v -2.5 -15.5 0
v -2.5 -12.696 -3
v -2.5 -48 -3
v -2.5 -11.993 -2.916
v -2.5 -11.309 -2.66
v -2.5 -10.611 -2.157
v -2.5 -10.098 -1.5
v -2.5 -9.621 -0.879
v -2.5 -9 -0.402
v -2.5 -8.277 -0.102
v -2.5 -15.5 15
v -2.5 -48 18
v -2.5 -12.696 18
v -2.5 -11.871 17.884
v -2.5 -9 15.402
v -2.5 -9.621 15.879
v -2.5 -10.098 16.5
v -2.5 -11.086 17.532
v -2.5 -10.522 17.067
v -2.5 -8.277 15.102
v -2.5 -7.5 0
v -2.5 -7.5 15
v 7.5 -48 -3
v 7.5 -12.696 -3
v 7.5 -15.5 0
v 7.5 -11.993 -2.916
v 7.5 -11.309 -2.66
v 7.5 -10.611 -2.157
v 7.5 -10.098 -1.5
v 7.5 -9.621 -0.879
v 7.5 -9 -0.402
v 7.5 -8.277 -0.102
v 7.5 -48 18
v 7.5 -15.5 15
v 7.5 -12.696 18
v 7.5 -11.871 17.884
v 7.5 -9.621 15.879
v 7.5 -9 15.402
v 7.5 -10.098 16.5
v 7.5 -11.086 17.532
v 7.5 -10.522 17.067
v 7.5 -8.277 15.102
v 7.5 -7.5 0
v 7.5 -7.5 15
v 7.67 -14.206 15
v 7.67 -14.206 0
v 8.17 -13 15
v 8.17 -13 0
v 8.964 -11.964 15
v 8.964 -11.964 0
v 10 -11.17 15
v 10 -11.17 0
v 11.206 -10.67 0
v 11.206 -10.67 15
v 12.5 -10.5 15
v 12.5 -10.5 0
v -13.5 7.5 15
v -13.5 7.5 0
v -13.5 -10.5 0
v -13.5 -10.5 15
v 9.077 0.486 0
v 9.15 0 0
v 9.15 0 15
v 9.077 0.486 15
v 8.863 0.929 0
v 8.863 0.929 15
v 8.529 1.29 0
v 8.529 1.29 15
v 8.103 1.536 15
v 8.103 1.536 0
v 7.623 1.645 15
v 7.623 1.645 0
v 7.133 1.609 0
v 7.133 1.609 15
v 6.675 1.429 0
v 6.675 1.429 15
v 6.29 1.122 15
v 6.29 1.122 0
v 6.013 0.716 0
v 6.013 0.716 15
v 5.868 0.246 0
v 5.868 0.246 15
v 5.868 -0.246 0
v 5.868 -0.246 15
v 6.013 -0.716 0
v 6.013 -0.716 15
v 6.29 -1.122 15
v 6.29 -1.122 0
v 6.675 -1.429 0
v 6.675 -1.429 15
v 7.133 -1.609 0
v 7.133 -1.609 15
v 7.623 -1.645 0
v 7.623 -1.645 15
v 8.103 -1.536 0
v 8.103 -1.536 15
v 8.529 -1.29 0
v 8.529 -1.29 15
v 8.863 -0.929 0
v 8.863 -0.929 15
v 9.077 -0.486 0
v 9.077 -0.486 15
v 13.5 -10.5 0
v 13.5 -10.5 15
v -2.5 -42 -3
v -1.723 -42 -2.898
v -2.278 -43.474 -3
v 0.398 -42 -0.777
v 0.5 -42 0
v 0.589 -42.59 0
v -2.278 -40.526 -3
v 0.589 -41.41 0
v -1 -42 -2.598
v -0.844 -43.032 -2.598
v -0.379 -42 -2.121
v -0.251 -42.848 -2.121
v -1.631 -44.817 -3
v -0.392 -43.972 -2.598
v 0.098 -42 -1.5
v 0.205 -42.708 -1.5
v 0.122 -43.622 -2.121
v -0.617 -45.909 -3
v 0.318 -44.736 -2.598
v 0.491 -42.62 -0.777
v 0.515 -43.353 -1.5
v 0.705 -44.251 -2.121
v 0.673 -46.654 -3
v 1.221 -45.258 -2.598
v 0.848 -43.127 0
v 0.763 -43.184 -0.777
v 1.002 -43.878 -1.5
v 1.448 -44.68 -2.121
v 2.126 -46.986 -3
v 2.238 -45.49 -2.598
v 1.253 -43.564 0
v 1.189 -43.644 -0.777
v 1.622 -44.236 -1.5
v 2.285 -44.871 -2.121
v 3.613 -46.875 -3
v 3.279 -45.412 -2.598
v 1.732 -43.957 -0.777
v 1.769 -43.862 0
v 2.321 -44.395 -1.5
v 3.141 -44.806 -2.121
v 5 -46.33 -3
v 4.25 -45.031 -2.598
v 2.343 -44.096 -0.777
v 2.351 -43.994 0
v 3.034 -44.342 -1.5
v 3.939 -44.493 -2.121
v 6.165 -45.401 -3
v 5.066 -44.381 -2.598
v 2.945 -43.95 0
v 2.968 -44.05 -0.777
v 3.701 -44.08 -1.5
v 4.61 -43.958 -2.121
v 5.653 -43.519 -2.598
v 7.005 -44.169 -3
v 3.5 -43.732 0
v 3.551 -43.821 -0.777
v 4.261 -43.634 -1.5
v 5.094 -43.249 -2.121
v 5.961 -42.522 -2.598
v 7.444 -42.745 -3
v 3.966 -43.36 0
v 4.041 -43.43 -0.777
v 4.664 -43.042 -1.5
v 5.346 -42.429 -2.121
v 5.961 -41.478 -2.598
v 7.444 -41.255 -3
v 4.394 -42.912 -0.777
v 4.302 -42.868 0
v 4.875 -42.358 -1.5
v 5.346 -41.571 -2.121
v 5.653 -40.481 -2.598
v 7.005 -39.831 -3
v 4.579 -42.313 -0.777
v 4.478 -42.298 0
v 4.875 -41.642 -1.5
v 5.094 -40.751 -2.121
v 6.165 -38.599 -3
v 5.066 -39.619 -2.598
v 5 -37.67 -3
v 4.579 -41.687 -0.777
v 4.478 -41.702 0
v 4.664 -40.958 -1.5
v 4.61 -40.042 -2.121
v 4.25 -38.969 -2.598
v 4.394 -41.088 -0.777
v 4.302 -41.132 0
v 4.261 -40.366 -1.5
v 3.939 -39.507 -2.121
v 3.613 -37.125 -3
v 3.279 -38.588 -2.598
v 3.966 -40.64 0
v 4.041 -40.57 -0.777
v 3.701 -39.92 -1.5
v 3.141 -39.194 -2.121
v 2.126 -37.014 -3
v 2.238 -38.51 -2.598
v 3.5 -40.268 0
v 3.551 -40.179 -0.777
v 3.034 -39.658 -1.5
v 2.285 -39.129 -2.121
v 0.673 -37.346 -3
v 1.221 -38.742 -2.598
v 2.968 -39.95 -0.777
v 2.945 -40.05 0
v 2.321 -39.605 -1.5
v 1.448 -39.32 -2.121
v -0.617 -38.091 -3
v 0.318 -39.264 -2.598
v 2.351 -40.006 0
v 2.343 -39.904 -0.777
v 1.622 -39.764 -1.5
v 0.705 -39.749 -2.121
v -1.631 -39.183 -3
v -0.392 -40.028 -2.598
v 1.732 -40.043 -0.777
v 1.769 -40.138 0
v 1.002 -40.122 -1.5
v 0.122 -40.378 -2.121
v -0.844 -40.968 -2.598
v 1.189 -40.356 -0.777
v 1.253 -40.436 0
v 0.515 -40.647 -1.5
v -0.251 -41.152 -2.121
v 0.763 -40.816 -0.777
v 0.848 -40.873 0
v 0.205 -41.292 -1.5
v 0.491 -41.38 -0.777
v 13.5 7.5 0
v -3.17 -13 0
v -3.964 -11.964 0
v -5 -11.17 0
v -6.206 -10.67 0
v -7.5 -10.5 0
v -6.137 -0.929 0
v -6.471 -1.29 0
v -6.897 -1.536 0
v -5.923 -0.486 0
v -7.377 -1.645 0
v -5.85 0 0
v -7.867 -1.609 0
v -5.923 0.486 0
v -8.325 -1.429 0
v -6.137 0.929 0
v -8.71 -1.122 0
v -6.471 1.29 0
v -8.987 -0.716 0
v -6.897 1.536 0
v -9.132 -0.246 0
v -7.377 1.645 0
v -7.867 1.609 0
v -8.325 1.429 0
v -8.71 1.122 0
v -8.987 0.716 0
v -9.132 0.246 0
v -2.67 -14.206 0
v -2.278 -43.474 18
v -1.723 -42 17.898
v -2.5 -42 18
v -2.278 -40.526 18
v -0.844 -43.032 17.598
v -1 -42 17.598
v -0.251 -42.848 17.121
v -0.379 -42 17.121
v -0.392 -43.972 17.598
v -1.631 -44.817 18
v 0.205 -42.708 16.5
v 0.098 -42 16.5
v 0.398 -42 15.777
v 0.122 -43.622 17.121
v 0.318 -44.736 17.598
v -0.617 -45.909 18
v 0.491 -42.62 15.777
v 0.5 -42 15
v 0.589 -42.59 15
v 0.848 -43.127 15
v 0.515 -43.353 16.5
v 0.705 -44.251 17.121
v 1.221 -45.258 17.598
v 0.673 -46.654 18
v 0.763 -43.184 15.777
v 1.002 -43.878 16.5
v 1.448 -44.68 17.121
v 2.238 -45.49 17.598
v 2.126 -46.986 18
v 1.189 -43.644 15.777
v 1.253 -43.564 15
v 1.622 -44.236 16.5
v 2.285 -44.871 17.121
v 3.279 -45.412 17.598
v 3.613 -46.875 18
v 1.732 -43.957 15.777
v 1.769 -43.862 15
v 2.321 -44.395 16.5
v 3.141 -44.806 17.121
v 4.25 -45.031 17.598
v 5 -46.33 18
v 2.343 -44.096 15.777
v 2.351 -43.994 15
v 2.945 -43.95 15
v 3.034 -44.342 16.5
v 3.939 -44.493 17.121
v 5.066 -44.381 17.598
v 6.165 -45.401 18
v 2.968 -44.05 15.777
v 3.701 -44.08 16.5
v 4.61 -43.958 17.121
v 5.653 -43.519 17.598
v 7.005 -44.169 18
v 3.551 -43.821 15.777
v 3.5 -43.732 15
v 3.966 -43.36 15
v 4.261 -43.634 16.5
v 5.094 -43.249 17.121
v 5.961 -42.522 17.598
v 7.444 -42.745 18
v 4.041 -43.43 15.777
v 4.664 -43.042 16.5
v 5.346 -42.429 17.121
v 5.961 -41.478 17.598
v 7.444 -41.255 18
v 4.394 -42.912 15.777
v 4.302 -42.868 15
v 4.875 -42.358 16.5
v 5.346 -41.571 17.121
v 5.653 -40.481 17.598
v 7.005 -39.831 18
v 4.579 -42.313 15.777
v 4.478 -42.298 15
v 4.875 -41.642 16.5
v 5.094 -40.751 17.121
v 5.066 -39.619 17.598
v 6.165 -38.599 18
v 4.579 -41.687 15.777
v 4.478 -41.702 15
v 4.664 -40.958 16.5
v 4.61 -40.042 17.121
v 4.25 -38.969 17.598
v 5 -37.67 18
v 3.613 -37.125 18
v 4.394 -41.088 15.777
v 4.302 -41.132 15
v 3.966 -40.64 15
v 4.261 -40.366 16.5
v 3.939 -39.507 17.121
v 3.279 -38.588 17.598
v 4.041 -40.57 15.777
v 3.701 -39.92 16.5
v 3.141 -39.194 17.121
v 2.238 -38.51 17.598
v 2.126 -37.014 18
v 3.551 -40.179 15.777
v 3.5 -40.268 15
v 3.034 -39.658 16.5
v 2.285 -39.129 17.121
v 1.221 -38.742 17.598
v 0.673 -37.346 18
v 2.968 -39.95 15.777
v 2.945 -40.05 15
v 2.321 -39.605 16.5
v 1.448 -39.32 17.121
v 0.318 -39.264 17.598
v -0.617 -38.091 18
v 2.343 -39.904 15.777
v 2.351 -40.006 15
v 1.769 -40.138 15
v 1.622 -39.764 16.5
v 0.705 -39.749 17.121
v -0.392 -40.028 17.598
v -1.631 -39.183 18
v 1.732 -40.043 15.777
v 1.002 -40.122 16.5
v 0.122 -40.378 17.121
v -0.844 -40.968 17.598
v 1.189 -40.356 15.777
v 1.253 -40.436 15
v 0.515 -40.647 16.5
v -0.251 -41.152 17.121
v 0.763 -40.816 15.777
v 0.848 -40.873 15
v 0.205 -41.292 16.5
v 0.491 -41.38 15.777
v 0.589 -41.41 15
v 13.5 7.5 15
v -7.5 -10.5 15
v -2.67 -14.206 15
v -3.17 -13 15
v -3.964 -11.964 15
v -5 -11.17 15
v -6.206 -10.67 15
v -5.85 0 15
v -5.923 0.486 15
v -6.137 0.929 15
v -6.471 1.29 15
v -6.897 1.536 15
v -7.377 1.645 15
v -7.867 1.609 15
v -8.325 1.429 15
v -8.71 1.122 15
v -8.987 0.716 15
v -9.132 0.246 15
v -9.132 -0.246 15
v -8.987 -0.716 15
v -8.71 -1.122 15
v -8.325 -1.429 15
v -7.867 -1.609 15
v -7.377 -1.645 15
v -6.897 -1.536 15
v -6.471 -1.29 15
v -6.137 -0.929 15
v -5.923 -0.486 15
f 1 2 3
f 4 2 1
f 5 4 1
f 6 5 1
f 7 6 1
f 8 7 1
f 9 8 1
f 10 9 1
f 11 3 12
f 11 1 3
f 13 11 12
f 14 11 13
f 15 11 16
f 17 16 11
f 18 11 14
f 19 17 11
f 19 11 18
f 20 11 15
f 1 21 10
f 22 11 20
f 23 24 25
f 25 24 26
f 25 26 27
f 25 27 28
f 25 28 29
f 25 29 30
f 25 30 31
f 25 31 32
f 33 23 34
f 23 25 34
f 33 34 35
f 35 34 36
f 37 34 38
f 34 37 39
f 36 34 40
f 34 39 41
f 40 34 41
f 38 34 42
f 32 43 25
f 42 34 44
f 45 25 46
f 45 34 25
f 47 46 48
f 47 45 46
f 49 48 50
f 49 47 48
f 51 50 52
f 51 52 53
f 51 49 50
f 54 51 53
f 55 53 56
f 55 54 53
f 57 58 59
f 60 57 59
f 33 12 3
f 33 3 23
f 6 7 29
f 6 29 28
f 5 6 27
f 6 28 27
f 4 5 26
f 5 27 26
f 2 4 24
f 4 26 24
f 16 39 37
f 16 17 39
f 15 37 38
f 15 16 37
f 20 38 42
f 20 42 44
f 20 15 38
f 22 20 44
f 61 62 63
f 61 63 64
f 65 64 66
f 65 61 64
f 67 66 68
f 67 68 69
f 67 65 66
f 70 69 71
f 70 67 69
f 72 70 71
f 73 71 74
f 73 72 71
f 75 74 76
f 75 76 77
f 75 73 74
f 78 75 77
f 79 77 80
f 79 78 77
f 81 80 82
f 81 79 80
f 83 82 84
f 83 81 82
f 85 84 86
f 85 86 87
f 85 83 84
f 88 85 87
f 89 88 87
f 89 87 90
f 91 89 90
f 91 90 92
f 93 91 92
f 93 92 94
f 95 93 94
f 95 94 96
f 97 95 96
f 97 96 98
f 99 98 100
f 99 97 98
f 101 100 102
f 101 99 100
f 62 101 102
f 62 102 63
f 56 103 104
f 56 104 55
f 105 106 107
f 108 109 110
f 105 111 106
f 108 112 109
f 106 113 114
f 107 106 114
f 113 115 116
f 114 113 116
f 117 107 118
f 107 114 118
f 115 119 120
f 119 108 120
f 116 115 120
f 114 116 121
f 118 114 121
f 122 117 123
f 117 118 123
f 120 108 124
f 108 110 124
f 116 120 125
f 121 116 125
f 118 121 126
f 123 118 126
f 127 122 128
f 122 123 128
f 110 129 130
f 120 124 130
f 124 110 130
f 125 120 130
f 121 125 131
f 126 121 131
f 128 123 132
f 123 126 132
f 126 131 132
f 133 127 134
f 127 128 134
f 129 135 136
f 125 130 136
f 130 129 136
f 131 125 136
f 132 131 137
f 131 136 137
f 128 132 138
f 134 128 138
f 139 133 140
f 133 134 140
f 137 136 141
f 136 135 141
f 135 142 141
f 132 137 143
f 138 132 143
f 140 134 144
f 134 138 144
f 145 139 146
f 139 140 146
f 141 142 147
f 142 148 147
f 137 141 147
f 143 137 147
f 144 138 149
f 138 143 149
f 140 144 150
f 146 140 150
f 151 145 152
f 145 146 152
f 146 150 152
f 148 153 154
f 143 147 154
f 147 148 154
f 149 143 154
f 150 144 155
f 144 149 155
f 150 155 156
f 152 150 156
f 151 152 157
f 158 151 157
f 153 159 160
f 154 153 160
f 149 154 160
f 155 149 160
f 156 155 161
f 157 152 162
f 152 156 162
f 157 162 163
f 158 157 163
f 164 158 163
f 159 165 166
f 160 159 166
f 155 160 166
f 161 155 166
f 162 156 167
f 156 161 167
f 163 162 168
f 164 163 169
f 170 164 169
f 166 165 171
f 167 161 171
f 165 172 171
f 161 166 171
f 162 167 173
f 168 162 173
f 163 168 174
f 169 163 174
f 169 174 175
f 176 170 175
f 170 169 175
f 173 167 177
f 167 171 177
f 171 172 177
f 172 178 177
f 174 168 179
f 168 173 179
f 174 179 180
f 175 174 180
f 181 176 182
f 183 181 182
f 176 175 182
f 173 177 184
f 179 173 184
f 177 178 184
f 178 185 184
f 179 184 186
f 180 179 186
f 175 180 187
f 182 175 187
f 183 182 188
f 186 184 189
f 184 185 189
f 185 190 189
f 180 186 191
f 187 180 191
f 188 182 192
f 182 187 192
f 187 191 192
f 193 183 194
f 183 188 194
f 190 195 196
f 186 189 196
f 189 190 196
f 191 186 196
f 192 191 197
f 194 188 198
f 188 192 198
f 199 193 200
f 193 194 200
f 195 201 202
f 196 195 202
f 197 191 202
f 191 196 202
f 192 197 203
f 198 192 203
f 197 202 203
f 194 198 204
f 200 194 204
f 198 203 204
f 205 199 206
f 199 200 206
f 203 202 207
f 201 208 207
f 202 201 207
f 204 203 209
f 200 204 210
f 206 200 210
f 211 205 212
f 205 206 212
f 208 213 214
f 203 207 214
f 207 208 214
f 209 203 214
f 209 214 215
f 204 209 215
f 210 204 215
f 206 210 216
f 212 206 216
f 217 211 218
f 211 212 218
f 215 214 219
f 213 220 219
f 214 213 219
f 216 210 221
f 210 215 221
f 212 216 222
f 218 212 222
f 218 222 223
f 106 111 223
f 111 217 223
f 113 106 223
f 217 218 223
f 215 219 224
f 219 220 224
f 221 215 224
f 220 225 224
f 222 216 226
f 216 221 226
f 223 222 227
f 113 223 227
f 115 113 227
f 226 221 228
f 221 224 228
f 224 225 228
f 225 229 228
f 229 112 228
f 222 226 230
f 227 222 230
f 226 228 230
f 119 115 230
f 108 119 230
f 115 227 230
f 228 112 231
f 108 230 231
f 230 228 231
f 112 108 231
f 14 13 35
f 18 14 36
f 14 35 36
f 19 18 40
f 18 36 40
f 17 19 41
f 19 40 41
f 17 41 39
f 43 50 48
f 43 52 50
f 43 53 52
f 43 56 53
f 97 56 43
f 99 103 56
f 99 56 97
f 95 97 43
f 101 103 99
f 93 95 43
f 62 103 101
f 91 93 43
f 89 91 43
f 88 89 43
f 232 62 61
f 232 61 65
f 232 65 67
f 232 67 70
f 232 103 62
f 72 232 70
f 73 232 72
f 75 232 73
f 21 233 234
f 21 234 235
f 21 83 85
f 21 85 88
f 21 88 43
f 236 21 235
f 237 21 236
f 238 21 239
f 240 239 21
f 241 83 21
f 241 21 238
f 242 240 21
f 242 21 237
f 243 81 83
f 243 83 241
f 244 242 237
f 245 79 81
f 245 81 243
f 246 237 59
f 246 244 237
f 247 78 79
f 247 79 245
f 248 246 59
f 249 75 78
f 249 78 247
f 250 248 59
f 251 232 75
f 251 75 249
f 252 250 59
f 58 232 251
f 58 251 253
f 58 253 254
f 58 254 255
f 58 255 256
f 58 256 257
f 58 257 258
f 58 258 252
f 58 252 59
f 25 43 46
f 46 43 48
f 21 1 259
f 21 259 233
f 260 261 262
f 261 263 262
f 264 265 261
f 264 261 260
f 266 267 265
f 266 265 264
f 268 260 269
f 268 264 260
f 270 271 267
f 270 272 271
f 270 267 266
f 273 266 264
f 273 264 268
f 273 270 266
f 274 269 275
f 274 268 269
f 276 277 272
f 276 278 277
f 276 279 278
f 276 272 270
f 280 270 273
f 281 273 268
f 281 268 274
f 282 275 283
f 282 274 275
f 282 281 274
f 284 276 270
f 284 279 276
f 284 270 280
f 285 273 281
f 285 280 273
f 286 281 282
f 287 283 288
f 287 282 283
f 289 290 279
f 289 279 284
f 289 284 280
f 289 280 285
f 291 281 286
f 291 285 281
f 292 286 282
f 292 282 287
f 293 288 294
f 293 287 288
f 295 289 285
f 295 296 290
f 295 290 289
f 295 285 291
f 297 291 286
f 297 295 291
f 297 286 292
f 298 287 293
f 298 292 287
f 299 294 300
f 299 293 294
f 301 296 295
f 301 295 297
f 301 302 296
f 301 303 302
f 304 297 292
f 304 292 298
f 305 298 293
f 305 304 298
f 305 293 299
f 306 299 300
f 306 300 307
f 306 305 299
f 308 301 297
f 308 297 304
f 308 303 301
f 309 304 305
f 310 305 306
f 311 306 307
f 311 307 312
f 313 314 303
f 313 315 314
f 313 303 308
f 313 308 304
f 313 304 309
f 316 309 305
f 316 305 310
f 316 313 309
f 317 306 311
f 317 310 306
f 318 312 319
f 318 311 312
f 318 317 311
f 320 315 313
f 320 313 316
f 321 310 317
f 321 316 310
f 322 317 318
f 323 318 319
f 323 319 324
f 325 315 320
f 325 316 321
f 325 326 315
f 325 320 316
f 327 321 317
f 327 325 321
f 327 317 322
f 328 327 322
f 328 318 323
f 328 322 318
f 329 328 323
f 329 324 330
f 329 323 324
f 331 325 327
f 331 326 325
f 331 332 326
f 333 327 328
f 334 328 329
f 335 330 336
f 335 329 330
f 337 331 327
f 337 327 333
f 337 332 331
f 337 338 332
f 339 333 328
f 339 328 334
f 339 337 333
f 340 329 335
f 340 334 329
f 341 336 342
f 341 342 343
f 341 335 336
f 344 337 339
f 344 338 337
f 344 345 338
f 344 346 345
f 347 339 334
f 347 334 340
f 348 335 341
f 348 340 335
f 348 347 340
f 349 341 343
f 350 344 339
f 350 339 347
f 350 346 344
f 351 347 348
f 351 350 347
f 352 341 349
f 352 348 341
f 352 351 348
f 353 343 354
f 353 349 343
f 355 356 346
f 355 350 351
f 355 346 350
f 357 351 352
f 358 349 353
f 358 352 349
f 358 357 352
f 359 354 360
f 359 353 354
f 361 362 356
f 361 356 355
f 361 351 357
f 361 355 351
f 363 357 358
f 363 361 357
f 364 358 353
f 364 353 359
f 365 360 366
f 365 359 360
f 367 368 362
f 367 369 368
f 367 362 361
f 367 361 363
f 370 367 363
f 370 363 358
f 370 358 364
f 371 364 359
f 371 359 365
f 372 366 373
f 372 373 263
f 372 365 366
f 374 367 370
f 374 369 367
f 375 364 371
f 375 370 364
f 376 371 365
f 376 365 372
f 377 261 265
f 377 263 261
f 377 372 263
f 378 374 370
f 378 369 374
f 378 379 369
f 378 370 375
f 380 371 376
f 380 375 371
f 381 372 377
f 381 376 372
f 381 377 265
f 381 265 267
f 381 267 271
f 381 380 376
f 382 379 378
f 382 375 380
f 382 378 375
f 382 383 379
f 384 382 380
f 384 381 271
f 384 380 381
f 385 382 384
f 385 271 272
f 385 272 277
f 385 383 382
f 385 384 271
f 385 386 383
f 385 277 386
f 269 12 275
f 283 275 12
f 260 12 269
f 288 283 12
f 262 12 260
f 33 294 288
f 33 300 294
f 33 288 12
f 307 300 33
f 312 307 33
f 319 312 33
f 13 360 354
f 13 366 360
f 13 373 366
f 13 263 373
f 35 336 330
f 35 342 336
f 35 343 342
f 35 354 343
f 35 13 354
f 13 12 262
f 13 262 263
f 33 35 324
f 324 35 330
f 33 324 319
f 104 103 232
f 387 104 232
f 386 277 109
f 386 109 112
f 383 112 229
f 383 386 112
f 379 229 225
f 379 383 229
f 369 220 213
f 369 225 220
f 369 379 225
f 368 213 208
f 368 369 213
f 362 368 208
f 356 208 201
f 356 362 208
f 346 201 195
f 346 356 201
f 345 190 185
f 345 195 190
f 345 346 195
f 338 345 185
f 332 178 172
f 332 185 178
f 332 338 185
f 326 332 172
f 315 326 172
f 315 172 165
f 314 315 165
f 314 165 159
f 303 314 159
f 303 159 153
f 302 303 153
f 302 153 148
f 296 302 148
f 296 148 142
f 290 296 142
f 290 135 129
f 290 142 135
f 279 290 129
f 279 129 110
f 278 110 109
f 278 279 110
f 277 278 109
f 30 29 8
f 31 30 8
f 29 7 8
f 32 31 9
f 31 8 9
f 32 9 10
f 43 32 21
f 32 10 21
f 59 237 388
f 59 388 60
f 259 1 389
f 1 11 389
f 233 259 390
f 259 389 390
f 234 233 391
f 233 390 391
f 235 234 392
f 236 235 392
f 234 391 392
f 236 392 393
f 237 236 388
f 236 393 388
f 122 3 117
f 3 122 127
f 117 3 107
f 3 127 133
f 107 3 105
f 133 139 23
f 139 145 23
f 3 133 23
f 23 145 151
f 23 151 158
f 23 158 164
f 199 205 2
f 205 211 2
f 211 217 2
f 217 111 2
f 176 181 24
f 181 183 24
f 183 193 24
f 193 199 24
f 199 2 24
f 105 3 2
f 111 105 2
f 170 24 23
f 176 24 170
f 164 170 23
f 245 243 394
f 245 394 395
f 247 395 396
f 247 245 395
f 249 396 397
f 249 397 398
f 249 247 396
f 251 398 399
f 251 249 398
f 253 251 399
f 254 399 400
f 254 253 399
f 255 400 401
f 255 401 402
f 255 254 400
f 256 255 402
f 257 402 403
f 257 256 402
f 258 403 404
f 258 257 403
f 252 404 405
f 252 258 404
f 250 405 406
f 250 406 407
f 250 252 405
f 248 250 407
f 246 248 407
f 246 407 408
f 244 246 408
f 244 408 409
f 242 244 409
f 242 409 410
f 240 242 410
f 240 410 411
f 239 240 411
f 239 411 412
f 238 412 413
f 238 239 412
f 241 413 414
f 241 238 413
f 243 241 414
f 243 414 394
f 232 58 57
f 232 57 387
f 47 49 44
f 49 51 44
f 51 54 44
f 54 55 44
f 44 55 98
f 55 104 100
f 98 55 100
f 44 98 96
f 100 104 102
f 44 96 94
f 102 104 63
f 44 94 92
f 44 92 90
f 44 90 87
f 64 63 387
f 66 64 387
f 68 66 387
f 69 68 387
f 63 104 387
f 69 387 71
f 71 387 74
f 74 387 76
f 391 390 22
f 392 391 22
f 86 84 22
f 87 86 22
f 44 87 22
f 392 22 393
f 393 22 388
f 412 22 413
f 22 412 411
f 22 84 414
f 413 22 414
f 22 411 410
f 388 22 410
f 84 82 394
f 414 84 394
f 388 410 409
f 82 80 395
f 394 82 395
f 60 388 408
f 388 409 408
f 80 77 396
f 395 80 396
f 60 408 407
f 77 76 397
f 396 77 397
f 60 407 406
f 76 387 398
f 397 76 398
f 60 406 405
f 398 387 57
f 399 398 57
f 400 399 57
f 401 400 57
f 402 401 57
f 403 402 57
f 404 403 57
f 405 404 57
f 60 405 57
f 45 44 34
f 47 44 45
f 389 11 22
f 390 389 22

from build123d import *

# Parameters (mm, degrees)
SKETCH_2_R               = 1.65
EXTRUDE_1_DEPTH          = 15
SKETCH_4_W               = 10
SKETCH_4_H               = 21
EXTRUDE_2_DEPTH          = 37.5
CUT_EXTRUDE_1_DEPTH      = 54.011791141
CUT_EXTRUDE_1_DEPTH_BACK = 54.011791141
SKETCH_5_R               = 2
FILLET_1_R               = 3
FILLET_2_R               = 3
FILLET_3_R               = 5


with BuildPart() as part:
    # 草图2 → 凸台-拉伸1 (new body)
    with BuildSketch(Plane.XY):
        Polygon((-13.5, -7.5), (-13.5, 7.5), (13.5, 7.5), (13.5, -7.5), (13.5, -10.5), (-13.5, -10.5), align=None)
        with Locations((7.5, 0)):
            Circle(SKETCH_2_R, mode=Mode.SUBTRACT)
        with Locations((-7.5, 0)):
            Circle(SKETCH_2_R, mode=Mode.SUBTRACT)
    extrude(amount=EXTRUDE_1_DEPTH)

    # 草图4 → 凸台-拉伸2 (add)
    with BuildSketch(Plane.XZ.offset(10.5)):
        with Locations((2.5, 7.5)):
            Rectangle(SKETCH_4_W, SKETCH_4_H)
    extrude(amount=EXTRUDE_2_DEPTH)

    # 草图5 → 切除-拉伸1 (cut, two sides: drawn at the far end of the back side and taken through both)
    with BuildSketch(Plane(origin=(0, 0, 0), x_dir=(-1, 0, 0), z_dir=(0, 0, -1)).offset(-CUT_EXTRUDE_1_DEPTH_BACK)):
        with Locations((-2.5, -42)):
            Circle(SKETCH_5_R)
    extrude(amount=CUT_EXTRUDE_1_DEPTH + CUT_EXTRUDE_1_DEPTH_BACK, mode=Mode.SUBTRACT)

    # 圆角1
    fillet_1_edges = [part.edges().sort_by_distance(p)[0] for p in [
        (4.5, -42, 18),
        (2.5, -10.5, 0),
        (2.5, -10.5, 15),
        (4.5, -42, -3),
    ]]
    fillet(fillet_1_edges, radius=FILLET_1_R - 0.0001)  # a hair under: the kernel refuses the full size

    # 圆角2
    fillet_2_edges = [part.edges().sort_by_distance(p)[0] for p in [
        (2.5, -10.5, -3),
        (2.5, -10.5, 18),
    ]]
    fillet(fillet_2_edges, radius=FILLET_2_R)

    # 圆角3
    fillet_3_edges = [part.edges().sort_by_distance(p)[0] for p in [
        (7.5, -10.5, 7.5),
        (-2.5, -10.5, 7.5),
    ]]
    fillet(fillet_3_edges, radius=FILLET_3_R)


solid = part.part
